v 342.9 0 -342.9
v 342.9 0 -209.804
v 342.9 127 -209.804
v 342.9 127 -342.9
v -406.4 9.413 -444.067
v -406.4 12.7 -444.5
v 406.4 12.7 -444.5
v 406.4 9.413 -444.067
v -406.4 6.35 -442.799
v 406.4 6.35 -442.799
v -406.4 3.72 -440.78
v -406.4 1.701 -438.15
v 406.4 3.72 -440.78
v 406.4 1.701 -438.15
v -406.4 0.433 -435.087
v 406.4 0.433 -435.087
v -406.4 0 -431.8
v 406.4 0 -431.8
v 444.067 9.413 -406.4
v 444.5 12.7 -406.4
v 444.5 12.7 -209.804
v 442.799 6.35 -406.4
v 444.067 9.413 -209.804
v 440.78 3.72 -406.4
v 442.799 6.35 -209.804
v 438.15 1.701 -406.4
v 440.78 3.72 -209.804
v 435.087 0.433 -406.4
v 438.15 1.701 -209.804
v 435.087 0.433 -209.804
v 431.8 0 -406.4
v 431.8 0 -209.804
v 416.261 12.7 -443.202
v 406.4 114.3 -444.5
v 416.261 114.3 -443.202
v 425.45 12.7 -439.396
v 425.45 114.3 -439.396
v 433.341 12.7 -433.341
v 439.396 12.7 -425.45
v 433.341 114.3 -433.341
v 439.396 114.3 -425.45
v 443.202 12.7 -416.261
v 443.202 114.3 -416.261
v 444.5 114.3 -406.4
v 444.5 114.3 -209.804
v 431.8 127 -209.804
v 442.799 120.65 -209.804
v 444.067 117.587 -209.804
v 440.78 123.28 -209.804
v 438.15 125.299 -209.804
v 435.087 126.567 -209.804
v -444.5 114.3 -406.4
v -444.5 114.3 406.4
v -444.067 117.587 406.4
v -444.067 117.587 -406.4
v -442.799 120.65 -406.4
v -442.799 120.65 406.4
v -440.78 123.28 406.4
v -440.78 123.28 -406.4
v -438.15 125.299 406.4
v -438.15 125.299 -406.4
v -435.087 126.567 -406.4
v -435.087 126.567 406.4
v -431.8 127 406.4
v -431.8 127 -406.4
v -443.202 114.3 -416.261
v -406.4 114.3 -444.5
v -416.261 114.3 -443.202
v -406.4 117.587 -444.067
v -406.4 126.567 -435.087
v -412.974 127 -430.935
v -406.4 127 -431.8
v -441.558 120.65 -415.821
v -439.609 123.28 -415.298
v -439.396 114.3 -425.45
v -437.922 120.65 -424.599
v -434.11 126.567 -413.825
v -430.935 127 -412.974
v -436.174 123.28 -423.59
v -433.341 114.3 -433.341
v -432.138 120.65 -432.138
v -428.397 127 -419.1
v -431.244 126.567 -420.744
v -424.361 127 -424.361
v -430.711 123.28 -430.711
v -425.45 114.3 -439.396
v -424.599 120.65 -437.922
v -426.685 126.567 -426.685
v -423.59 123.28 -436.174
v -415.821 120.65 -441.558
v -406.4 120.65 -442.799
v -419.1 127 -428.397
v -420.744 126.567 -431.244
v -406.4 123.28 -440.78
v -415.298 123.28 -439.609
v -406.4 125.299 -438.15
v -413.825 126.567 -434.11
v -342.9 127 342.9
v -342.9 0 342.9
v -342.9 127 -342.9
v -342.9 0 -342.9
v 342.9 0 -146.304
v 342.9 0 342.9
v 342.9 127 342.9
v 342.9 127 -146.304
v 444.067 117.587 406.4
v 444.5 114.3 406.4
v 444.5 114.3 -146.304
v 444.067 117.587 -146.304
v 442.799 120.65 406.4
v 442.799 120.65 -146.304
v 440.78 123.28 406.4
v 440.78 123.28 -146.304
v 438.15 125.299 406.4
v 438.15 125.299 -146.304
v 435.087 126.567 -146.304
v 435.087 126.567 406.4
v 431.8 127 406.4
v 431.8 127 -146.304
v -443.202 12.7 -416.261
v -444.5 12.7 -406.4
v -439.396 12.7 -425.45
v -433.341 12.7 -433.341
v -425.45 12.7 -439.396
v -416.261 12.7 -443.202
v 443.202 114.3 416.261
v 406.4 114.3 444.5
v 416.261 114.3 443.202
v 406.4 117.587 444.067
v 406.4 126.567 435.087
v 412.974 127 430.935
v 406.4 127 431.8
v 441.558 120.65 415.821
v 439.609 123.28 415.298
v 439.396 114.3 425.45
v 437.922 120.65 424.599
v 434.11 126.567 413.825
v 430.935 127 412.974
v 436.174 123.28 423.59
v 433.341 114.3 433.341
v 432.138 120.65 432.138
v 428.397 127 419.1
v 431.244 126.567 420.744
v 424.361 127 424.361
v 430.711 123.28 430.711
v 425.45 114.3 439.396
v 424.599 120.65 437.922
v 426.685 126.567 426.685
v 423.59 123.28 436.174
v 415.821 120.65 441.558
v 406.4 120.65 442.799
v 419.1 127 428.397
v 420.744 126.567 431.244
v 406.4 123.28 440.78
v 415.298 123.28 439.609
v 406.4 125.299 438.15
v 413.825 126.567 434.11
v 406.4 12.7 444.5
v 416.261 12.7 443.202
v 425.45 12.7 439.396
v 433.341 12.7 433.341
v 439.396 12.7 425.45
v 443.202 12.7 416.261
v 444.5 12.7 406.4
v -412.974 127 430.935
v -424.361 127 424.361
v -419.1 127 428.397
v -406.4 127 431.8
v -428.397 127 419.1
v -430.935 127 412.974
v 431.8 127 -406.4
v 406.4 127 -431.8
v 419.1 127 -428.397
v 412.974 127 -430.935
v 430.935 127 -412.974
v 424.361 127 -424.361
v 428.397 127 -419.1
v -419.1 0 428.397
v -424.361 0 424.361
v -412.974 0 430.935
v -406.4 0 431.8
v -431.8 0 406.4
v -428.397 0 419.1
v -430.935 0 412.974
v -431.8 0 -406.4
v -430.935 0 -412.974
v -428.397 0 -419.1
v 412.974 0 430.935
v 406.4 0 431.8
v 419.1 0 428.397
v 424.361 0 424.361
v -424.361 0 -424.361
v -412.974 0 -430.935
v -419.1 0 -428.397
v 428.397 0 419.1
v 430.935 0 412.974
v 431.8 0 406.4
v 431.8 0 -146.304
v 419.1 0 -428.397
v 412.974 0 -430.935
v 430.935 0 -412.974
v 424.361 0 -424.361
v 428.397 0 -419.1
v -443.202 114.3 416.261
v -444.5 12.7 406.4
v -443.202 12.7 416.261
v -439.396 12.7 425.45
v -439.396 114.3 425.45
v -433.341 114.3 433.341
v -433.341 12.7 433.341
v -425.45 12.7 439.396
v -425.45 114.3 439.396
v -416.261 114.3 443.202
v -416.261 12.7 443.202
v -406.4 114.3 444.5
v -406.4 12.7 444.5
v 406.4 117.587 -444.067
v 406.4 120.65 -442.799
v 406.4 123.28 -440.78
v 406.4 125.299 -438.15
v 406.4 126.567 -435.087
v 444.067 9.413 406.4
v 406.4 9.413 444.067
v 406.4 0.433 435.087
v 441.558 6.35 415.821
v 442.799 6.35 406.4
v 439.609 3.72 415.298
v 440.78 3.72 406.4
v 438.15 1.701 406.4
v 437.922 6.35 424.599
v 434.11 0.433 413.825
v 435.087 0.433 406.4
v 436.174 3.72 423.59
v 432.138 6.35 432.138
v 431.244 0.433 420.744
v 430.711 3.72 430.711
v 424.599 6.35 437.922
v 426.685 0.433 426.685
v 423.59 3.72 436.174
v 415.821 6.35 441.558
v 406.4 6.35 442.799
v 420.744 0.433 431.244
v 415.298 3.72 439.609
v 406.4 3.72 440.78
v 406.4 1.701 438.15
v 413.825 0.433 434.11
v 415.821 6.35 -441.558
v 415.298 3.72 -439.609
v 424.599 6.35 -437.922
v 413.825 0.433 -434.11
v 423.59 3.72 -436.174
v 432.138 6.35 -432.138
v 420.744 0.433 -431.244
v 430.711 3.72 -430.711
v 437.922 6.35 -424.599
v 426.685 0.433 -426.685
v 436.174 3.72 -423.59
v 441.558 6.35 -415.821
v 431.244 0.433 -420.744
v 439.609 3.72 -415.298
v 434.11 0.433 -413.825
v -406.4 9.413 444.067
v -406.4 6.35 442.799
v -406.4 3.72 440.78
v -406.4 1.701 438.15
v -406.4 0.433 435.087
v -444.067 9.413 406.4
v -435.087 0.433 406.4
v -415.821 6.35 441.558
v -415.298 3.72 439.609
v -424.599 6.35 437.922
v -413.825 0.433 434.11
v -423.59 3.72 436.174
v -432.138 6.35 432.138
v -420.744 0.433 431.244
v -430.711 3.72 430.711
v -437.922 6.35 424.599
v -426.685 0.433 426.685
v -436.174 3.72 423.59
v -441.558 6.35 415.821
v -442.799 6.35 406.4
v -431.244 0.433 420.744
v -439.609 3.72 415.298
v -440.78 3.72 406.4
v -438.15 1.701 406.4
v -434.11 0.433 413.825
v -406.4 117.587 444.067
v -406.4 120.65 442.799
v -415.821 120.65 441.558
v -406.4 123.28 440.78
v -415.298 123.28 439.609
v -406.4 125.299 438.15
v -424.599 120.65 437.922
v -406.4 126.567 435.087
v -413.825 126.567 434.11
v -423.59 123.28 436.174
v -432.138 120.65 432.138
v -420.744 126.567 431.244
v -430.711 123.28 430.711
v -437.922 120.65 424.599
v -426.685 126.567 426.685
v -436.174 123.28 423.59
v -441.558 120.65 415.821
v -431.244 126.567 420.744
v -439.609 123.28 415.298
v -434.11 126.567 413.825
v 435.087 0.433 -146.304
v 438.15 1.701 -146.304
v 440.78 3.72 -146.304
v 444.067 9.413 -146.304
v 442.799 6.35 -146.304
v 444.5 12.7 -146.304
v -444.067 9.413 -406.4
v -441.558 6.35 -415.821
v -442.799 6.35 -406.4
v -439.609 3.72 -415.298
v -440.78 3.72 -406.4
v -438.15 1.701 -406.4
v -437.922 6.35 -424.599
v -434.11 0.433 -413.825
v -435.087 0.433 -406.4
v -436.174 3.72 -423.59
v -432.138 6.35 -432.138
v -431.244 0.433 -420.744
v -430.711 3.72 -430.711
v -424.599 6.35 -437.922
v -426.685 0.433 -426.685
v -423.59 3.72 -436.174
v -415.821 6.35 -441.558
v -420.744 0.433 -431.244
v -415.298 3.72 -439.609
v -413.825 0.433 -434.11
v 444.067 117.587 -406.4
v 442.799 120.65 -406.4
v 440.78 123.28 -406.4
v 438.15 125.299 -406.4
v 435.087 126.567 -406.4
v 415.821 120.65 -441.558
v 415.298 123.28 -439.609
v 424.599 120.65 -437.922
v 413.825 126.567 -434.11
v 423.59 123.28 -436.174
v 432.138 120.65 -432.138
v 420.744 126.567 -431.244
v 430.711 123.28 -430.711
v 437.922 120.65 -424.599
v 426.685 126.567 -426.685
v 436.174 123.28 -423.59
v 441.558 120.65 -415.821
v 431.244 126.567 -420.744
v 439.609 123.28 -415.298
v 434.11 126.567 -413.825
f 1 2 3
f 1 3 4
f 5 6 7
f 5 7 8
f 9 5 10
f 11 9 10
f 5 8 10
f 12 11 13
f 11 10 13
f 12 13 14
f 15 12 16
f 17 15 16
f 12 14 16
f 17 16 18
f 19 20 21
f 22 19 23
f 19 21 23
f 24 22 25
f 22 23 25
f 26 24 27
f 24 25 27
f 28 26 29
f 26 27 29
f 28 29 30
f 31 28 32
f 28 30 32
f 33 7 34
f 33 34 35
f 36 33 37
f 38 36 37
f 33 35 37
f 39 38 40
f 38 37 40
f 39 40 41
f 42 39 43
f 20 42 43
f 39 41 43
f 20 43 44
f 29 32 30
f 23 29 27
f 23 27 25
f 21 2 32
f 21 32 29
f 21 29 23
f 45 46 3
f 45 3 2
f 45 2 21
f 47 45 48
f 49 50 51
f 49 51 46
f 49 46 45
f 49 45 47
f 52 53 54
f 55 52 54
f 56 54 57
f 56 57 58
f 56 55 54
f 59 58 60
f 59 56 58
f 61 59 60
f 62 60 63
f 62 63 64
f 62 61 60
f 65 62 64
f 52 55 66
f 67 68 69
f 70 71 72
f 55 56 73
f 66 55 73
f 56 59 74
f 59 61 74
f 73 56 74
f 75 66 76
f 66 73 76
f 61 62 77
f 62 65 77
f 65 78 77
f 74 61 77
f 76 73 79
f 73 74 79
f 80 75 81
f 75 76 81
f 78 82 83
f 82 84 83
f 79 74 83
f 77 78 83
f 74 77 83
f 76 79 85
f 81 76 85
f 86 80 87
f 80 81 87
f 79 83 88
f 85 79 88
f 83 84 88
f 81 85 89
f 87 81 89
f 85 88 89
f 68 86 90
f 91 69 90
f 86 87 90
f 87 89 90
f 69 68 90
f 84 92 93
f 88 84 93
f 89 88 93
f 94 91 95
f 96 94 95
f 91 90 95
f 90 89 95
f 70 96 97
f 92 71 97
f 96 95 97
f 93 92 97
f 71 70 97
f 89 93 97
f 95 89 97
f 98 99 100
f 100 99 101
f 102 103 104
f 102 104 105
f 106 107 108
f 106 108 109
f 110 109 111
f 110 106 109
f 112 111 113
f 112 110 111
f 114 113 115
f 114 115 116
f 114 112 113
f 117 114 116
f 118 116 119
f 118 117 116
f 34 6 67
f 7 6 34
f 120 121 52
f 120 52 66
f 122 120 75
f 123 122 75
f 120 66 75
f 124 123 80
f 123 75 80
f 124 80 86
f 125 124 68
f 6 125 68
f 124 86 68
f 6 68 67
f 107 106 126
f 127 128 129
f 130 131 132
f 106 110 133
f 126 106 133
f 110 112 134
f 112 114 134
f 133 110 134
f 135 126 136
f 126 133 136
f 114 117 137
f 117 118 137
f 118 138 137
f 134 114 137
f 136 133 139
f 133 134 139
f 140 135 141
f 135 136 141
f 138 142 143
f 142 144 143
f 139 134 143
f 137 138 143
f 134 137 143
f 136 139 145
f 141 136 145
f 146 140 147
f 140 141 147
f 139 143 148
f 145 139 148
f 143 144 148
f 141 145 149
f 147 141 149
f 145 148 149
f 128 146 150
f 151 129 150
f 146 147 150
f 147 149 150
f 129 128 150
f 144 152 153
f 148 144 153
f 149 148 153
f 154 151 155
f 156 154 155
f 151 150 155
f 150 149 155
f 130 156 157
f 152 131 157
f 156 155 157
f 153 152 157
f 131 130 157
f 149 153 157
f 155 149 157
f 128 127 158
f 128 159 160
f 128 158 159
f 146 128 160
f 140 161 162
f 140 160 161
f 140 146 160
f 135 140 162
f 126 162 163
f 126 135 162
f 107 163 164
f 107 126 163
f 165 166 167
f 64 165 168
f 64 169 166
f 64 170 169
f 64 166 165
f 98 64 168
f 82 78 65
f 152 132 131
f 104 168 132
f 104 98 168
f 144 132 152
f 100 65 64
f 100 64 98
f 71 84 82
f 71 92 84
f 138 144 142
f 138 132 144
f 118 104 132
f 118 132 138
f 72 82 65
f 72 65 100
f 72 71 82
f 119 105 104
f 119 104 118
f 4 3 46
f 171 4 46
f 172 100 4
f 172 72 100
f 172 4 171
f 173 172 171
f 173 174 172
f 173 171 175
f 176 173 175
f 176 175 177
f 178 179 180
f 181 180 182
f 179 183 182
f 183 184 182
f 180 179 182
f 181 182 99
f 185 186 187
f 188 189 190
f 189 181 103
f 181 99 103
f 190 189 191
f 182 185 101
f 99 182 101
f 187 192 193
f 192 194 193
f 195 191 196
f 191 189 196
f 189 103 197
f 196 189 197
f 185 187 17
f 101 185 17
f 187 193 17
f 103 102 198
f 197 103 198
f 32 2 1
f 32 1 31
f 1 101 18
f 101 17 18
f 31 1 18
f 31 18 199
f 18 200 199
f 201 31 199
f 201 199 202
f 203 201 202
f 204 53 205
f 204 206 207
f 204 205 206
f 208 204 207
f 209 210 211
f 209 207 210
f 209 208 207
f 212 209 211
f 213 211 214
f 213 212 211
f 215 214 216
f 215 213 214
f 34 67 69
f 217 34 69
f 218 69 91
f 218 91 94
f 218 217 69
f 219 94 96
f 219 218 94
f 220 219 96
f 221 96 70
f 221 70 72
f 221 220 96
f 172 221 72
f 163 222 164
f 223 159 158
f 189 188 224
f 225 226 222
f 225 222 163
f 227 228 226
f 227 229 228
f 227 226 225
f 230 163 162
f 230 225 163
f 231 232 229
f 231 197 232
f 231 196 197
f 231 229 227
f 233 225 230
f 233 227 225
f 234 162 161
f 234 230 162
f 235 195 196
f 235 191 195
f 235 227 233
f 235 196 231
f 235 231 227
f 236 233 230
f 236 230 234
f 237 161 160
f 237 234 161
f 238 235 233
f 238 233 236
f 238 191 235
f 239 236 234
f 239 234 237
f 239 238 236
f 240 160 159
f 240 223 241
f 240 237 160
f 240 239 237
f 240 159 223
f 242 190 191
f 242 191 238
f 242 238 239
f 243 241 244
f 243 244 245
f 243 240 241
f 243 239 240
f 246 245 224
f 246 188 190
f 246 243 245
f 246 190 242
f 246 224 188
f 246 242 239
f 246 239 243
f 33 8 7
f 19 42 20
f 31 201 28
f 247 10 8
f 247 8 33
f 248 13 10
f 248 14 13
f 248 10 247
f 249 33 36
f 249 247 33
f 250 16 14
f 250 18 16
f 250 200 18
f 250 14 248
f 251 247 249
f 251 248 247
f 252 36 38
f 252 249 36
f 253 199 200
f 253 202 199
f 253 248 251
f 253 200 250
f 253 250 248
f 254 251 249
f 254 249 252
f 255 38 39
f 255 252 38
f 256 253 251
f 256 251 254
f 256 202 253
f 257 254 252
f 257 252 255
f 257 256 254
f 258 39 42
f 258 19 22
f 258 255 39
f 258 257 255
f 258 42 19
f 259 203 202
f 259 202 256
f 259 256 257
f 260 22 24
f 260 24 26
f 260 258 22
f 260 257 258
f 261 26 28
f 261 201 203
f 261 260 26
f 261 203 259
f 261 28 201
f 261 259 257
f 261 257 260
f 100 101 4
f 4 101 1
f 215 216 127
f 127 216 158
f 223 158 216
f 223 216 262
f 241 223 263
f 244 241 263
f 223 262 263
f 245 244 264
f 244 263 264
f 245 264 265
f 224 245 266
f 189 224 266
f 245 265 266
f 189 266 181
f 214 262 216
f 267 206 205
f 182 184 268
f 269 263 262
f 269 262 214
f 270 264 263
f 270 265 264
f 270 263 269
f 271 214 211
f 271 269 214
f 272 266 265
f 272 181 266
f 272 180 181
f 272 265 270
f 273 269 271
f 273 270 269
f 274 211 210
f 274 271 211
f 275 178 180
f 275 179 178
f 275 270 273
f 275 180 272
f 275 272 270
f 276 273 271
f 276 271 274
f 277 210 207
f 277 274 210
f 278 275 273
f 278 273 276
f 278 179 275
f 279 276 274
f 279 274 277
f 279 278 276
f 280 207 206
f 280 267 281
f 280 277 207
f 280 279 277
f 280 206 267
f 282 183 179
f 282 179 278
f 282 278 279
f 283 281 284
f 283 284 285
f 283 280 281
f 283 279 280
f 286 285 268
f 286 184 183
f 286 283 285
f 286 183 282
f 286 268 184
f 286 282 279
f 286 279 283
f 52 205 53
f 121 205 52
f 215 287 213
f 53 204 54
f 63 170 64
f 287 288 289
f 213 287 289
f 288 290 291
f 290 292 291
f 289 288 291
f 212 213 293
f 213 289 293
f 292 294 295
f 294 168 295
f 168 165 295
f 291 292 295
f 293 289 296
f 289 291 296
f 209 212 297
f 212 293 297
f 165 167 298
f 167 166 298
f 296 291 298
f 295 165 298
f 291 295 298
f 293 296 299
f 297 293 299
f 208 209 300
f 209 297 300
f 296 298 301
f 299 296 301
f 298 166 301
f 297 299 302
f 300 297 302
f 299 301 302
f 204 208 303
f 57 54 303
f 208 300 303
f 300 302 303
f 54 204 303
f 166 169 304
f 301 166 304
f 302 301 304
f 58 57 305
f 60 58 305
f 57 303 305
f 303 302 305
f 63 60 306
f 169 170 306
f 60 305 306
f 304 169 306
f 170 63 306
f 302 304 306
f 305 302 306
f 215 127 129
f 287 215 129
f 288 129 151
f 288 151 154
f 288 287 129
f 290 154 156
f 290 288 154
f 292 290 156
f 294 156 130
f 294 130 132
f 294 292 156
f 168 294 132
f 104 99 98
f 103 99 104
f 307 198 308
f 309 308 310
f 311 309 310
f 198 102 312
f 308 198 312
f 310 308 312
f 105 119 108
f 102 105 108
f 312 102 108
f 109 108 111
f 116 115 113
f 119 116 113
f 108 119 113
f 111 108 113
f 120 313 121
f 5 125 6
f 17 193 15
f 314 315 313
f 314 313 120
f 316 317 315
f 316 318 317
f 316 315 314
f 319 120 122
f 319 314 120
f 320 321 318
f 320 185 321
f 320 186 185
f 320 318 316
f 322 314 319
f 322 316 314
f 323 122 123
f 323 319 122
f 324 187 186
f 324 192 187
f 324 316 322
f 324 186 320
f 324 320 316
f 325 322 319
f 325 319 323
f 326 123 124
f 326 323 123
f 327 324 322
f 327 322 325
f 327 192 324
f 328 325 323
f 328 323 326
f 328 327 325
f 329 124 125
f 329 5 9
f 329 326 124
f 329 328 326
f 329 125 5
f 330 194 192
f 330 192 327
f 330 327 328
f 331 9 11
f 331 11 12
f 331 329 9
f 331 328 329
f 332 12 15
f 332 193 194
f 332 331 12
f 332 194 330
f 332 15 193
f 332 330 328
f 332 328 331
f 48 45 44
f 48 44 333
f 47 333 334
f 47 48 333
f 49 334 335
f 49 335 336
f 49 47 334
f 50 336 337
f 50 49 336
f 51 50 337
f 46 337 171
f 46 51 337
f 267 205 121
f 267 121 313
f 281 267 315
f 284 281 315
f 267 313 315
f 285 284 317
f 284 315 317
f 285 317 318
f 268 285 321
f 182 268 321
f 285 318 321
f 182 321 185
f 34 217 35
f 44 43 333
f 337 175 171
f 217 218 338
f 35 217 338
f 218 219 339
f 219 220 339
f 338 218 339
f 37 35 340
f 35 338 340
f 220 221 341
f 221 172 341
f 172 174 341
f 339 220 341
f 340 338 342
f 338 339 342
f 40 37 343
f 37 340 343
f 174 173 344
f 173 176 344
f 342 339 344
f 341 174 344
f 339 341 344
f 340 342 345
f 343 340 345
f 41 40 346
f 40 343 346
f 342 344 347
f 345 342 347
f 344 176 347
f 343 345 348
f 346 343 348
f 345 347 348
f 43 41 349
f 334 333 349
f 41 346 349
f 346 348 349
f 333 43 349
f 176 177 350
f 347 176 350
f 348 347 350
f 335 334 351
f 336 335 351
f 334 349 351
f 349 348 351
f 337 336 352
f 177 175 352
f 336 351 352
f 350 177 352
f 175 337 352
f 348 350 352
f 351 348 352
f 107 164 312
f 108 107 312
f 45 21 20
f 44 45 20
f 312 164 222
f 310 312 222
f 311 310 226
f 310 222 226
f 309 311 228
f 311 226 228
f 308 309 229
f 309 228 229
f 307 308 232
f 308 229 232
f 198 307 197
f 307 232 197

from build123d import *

# Parameters (mm, degrees)
SKETCH1_W           = 889
SKETCH1_H           = 889
SKETCH1_W_2         = 685.8
SKETCH1_H_2         = 685.8
BOSS_EXTRUDE1_DEPTH = 127
FILLET1_R           = 38.1
FILLET2_R           = 12.7
SKETCH2_W           = 101.6
SKETCH2_H           = 63.5
CUT_EXTRUDE1_DEPTH  = 128


with BuildPart() as part:
    # Sketch1 → Boss-Extrude1 (new body)
    with BuildSketch(Plane(origin=(0, 0, 0), x_dir=(1, 0, 0), z_dir=(0, 1, 0))):
        Rectangle(SKETCH1_W, SKETCH1_H)
        Rectangle(SKETCH1_W_2, SKETCH1_H_2, mode=Mode.SUBTRACT)
    extrude(amount=BOSS_EXTRUDE1_DEPTH)

    # Fillet1
    fillet1_edges = [part.edges().sort_by_distance(p)[0] for p in [
        (444.5, 63.5, -444.5),
        (444.5, 63.5, 444.5),
        (-444.5, 63.5, 444.5),
        (-444.5, 63.5, -444.5),
    ]]
    fillet(fillet1_edges, radius=FILLET1_R)

    # Fillet2
    fillet2_edges = [part.edges().sort_by_distance(p)[0] for p in [
        (-444.5, 0, 0),
        (-444.5, 127, 0),
        (0, 0, -444.5),
        (444.5, 0, 0),
        (0, 0, 444.5),
        (-433.340768363, 0, 433.340768363),
        (433.340768363, 0, 433.340768363),
        (433.340768363, 0, -433.340768363),
        (-433.340768363, 0, -433.340768363),
        (0, 127, -444.5),
        (0, 127, 444.5),
        (444.5, 127, 0),
        (-433.340768363, 127, 433.340768363),
        (433.340768363, 127, 433.340768363),
        (433.340768363, 127, -433.340768363),
        (-433.340768363, 127, -433.340768363),
    ]]
    fillet(fillet2_edges, radius=FILLET2_R)

    # Sketch2 → Cut-Extrude1 (cut, through all)
    with BuildSketch(Plane(origin=(0, 127, 0), x_dir=(1, 0, 0), z_dir=(0, 1, 0))):
        with Locations((393.7, 178.054)):
            Rectangle(SKETCH2_W, SKETCH2_H)
    extrude(amount=-CUT_EXTRUDE1_DEPTH, mode=Mode.SUBTRACT)


solid = part.part
